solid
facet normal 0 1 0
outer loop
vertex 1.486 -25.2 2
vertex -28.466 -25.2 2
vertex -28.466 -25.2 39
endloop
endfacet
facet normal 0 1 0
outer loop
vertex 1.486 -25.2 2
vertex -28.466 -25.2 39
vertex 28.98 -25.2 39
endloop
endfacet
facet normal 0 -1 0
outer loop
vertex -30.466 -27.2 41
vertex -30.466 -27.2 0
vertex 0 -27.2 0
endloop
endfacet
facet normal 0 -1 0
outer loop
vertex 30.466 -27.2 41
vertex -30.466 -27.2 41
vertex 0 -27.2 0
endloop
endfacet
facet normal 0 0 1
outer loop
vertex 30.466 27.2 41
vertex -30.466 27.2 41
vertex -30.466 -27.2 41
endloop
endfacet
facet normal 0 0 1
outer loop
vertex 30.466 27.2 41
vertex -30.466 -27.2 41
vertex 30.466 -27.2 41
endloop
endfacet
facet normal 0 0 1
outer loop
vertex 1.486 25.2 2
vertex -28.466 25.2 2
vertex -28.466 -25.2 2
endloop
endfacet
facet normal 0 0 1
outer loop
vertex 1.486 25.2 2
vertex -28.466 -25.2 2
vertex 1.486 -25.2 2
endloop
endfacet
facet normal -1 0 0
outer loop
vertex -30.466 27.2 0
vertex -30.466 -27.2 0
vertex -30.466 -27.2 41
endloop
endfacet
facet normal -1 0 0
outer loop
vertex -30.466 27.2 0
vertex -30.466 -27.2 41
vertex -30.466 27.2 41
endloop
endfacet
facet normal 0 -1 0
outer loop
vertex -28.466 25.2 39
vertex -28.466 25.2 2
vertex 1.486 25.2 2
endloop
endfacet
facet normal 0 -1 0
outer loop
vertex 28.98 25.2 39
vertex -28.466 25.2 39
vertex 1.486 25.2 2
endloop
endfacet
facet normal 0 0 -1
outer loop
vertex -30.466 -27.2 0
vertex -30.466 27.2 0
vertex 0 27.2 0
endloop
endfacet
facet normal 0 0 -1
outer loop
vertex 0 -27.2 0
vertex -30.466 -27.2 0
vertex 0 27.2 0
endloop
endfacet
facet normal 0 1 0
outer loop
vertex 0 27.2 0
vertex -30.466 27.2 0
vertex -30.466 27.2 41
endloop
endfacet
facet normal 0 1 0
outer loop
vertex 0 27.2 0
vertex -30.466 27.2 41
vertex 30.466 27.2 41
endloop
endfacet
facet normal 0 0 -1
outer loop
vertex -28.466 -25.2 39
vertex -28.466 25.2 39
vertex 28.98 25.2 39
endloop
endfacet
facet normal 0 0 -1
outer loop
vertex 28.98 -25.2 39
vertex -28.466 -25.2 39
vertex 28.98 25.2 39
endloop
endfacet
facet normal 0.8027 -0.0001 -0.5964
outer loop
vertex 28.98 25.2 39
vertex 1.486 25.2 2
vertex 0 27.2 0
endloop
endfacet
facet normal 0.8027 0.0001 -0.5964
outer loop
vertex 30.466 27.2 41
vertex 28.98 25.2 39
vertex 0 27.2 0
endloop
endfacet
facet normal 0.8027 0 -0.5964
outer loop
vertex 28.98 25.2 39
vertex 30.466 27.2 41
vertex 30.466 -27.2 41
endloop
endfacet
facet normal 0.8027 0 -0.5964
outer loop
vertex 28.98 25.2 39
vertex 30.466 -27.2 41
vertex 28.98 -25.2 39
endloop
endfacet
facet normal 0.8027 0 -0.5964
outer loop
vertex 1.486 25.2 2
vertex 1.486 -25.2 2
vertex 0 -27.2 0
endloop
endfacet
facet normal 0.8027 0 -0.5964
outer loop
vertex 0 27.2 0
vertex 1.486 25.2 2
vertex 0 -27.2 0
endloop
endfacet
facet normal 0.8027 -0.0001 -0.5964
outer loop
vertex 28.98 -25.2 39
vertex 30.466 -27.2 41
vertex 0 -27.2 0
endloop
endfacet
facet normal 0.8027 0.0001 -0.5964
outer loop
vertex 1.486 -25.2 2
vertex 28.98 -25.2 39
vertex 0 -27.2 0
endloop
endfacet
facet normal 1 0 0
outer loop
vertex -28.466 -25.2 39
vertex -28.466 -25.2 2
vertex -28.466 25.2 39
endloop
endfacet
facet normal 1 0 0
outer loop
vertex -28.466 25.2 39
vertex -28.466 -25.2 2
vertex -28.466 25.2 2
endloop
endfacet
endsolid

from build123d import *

# Parameters (mm, degrees)
F0_W     = 60.931796
F0_H     = 54.4
F0_W_2   = 56.931796
F0_H_2   = 50.4
F1_DEPTH = 41
F3_DEPTH = 54.401
F4_T     = -2


with BuildPart() as f1:
    # F0 (on Top) → F1 (new body)
    with BuildSketch(Plane.XY):
        Rectangle(F0_W, F0_H)
        Rectangle(F0_W_2, F0_H_2, mode=Mode.SUBTRACT)
        Rectangle(F0_W_2, F0_H_2)
    extrude(amount=F1_DEPTH)

    # F2 (on face) → F3 (cut, through all)
    with BuildSketch(Plane.XZ.offset(27.2)):
        Polygon((30.465898, 0), (30.465898, 41), (0, 0), align=None)
    extrude(amount=-F3_DEPTH, mode=Mode.SUBTRACT)

    # F4
    f4_openings = [f1.faces().sort_by_distance(p)[0] for p in [
        (15.232949, 0, 20.5),
    ]]
    offset(amount=F4_T, openings=f4_openings)


solid = f1.part
